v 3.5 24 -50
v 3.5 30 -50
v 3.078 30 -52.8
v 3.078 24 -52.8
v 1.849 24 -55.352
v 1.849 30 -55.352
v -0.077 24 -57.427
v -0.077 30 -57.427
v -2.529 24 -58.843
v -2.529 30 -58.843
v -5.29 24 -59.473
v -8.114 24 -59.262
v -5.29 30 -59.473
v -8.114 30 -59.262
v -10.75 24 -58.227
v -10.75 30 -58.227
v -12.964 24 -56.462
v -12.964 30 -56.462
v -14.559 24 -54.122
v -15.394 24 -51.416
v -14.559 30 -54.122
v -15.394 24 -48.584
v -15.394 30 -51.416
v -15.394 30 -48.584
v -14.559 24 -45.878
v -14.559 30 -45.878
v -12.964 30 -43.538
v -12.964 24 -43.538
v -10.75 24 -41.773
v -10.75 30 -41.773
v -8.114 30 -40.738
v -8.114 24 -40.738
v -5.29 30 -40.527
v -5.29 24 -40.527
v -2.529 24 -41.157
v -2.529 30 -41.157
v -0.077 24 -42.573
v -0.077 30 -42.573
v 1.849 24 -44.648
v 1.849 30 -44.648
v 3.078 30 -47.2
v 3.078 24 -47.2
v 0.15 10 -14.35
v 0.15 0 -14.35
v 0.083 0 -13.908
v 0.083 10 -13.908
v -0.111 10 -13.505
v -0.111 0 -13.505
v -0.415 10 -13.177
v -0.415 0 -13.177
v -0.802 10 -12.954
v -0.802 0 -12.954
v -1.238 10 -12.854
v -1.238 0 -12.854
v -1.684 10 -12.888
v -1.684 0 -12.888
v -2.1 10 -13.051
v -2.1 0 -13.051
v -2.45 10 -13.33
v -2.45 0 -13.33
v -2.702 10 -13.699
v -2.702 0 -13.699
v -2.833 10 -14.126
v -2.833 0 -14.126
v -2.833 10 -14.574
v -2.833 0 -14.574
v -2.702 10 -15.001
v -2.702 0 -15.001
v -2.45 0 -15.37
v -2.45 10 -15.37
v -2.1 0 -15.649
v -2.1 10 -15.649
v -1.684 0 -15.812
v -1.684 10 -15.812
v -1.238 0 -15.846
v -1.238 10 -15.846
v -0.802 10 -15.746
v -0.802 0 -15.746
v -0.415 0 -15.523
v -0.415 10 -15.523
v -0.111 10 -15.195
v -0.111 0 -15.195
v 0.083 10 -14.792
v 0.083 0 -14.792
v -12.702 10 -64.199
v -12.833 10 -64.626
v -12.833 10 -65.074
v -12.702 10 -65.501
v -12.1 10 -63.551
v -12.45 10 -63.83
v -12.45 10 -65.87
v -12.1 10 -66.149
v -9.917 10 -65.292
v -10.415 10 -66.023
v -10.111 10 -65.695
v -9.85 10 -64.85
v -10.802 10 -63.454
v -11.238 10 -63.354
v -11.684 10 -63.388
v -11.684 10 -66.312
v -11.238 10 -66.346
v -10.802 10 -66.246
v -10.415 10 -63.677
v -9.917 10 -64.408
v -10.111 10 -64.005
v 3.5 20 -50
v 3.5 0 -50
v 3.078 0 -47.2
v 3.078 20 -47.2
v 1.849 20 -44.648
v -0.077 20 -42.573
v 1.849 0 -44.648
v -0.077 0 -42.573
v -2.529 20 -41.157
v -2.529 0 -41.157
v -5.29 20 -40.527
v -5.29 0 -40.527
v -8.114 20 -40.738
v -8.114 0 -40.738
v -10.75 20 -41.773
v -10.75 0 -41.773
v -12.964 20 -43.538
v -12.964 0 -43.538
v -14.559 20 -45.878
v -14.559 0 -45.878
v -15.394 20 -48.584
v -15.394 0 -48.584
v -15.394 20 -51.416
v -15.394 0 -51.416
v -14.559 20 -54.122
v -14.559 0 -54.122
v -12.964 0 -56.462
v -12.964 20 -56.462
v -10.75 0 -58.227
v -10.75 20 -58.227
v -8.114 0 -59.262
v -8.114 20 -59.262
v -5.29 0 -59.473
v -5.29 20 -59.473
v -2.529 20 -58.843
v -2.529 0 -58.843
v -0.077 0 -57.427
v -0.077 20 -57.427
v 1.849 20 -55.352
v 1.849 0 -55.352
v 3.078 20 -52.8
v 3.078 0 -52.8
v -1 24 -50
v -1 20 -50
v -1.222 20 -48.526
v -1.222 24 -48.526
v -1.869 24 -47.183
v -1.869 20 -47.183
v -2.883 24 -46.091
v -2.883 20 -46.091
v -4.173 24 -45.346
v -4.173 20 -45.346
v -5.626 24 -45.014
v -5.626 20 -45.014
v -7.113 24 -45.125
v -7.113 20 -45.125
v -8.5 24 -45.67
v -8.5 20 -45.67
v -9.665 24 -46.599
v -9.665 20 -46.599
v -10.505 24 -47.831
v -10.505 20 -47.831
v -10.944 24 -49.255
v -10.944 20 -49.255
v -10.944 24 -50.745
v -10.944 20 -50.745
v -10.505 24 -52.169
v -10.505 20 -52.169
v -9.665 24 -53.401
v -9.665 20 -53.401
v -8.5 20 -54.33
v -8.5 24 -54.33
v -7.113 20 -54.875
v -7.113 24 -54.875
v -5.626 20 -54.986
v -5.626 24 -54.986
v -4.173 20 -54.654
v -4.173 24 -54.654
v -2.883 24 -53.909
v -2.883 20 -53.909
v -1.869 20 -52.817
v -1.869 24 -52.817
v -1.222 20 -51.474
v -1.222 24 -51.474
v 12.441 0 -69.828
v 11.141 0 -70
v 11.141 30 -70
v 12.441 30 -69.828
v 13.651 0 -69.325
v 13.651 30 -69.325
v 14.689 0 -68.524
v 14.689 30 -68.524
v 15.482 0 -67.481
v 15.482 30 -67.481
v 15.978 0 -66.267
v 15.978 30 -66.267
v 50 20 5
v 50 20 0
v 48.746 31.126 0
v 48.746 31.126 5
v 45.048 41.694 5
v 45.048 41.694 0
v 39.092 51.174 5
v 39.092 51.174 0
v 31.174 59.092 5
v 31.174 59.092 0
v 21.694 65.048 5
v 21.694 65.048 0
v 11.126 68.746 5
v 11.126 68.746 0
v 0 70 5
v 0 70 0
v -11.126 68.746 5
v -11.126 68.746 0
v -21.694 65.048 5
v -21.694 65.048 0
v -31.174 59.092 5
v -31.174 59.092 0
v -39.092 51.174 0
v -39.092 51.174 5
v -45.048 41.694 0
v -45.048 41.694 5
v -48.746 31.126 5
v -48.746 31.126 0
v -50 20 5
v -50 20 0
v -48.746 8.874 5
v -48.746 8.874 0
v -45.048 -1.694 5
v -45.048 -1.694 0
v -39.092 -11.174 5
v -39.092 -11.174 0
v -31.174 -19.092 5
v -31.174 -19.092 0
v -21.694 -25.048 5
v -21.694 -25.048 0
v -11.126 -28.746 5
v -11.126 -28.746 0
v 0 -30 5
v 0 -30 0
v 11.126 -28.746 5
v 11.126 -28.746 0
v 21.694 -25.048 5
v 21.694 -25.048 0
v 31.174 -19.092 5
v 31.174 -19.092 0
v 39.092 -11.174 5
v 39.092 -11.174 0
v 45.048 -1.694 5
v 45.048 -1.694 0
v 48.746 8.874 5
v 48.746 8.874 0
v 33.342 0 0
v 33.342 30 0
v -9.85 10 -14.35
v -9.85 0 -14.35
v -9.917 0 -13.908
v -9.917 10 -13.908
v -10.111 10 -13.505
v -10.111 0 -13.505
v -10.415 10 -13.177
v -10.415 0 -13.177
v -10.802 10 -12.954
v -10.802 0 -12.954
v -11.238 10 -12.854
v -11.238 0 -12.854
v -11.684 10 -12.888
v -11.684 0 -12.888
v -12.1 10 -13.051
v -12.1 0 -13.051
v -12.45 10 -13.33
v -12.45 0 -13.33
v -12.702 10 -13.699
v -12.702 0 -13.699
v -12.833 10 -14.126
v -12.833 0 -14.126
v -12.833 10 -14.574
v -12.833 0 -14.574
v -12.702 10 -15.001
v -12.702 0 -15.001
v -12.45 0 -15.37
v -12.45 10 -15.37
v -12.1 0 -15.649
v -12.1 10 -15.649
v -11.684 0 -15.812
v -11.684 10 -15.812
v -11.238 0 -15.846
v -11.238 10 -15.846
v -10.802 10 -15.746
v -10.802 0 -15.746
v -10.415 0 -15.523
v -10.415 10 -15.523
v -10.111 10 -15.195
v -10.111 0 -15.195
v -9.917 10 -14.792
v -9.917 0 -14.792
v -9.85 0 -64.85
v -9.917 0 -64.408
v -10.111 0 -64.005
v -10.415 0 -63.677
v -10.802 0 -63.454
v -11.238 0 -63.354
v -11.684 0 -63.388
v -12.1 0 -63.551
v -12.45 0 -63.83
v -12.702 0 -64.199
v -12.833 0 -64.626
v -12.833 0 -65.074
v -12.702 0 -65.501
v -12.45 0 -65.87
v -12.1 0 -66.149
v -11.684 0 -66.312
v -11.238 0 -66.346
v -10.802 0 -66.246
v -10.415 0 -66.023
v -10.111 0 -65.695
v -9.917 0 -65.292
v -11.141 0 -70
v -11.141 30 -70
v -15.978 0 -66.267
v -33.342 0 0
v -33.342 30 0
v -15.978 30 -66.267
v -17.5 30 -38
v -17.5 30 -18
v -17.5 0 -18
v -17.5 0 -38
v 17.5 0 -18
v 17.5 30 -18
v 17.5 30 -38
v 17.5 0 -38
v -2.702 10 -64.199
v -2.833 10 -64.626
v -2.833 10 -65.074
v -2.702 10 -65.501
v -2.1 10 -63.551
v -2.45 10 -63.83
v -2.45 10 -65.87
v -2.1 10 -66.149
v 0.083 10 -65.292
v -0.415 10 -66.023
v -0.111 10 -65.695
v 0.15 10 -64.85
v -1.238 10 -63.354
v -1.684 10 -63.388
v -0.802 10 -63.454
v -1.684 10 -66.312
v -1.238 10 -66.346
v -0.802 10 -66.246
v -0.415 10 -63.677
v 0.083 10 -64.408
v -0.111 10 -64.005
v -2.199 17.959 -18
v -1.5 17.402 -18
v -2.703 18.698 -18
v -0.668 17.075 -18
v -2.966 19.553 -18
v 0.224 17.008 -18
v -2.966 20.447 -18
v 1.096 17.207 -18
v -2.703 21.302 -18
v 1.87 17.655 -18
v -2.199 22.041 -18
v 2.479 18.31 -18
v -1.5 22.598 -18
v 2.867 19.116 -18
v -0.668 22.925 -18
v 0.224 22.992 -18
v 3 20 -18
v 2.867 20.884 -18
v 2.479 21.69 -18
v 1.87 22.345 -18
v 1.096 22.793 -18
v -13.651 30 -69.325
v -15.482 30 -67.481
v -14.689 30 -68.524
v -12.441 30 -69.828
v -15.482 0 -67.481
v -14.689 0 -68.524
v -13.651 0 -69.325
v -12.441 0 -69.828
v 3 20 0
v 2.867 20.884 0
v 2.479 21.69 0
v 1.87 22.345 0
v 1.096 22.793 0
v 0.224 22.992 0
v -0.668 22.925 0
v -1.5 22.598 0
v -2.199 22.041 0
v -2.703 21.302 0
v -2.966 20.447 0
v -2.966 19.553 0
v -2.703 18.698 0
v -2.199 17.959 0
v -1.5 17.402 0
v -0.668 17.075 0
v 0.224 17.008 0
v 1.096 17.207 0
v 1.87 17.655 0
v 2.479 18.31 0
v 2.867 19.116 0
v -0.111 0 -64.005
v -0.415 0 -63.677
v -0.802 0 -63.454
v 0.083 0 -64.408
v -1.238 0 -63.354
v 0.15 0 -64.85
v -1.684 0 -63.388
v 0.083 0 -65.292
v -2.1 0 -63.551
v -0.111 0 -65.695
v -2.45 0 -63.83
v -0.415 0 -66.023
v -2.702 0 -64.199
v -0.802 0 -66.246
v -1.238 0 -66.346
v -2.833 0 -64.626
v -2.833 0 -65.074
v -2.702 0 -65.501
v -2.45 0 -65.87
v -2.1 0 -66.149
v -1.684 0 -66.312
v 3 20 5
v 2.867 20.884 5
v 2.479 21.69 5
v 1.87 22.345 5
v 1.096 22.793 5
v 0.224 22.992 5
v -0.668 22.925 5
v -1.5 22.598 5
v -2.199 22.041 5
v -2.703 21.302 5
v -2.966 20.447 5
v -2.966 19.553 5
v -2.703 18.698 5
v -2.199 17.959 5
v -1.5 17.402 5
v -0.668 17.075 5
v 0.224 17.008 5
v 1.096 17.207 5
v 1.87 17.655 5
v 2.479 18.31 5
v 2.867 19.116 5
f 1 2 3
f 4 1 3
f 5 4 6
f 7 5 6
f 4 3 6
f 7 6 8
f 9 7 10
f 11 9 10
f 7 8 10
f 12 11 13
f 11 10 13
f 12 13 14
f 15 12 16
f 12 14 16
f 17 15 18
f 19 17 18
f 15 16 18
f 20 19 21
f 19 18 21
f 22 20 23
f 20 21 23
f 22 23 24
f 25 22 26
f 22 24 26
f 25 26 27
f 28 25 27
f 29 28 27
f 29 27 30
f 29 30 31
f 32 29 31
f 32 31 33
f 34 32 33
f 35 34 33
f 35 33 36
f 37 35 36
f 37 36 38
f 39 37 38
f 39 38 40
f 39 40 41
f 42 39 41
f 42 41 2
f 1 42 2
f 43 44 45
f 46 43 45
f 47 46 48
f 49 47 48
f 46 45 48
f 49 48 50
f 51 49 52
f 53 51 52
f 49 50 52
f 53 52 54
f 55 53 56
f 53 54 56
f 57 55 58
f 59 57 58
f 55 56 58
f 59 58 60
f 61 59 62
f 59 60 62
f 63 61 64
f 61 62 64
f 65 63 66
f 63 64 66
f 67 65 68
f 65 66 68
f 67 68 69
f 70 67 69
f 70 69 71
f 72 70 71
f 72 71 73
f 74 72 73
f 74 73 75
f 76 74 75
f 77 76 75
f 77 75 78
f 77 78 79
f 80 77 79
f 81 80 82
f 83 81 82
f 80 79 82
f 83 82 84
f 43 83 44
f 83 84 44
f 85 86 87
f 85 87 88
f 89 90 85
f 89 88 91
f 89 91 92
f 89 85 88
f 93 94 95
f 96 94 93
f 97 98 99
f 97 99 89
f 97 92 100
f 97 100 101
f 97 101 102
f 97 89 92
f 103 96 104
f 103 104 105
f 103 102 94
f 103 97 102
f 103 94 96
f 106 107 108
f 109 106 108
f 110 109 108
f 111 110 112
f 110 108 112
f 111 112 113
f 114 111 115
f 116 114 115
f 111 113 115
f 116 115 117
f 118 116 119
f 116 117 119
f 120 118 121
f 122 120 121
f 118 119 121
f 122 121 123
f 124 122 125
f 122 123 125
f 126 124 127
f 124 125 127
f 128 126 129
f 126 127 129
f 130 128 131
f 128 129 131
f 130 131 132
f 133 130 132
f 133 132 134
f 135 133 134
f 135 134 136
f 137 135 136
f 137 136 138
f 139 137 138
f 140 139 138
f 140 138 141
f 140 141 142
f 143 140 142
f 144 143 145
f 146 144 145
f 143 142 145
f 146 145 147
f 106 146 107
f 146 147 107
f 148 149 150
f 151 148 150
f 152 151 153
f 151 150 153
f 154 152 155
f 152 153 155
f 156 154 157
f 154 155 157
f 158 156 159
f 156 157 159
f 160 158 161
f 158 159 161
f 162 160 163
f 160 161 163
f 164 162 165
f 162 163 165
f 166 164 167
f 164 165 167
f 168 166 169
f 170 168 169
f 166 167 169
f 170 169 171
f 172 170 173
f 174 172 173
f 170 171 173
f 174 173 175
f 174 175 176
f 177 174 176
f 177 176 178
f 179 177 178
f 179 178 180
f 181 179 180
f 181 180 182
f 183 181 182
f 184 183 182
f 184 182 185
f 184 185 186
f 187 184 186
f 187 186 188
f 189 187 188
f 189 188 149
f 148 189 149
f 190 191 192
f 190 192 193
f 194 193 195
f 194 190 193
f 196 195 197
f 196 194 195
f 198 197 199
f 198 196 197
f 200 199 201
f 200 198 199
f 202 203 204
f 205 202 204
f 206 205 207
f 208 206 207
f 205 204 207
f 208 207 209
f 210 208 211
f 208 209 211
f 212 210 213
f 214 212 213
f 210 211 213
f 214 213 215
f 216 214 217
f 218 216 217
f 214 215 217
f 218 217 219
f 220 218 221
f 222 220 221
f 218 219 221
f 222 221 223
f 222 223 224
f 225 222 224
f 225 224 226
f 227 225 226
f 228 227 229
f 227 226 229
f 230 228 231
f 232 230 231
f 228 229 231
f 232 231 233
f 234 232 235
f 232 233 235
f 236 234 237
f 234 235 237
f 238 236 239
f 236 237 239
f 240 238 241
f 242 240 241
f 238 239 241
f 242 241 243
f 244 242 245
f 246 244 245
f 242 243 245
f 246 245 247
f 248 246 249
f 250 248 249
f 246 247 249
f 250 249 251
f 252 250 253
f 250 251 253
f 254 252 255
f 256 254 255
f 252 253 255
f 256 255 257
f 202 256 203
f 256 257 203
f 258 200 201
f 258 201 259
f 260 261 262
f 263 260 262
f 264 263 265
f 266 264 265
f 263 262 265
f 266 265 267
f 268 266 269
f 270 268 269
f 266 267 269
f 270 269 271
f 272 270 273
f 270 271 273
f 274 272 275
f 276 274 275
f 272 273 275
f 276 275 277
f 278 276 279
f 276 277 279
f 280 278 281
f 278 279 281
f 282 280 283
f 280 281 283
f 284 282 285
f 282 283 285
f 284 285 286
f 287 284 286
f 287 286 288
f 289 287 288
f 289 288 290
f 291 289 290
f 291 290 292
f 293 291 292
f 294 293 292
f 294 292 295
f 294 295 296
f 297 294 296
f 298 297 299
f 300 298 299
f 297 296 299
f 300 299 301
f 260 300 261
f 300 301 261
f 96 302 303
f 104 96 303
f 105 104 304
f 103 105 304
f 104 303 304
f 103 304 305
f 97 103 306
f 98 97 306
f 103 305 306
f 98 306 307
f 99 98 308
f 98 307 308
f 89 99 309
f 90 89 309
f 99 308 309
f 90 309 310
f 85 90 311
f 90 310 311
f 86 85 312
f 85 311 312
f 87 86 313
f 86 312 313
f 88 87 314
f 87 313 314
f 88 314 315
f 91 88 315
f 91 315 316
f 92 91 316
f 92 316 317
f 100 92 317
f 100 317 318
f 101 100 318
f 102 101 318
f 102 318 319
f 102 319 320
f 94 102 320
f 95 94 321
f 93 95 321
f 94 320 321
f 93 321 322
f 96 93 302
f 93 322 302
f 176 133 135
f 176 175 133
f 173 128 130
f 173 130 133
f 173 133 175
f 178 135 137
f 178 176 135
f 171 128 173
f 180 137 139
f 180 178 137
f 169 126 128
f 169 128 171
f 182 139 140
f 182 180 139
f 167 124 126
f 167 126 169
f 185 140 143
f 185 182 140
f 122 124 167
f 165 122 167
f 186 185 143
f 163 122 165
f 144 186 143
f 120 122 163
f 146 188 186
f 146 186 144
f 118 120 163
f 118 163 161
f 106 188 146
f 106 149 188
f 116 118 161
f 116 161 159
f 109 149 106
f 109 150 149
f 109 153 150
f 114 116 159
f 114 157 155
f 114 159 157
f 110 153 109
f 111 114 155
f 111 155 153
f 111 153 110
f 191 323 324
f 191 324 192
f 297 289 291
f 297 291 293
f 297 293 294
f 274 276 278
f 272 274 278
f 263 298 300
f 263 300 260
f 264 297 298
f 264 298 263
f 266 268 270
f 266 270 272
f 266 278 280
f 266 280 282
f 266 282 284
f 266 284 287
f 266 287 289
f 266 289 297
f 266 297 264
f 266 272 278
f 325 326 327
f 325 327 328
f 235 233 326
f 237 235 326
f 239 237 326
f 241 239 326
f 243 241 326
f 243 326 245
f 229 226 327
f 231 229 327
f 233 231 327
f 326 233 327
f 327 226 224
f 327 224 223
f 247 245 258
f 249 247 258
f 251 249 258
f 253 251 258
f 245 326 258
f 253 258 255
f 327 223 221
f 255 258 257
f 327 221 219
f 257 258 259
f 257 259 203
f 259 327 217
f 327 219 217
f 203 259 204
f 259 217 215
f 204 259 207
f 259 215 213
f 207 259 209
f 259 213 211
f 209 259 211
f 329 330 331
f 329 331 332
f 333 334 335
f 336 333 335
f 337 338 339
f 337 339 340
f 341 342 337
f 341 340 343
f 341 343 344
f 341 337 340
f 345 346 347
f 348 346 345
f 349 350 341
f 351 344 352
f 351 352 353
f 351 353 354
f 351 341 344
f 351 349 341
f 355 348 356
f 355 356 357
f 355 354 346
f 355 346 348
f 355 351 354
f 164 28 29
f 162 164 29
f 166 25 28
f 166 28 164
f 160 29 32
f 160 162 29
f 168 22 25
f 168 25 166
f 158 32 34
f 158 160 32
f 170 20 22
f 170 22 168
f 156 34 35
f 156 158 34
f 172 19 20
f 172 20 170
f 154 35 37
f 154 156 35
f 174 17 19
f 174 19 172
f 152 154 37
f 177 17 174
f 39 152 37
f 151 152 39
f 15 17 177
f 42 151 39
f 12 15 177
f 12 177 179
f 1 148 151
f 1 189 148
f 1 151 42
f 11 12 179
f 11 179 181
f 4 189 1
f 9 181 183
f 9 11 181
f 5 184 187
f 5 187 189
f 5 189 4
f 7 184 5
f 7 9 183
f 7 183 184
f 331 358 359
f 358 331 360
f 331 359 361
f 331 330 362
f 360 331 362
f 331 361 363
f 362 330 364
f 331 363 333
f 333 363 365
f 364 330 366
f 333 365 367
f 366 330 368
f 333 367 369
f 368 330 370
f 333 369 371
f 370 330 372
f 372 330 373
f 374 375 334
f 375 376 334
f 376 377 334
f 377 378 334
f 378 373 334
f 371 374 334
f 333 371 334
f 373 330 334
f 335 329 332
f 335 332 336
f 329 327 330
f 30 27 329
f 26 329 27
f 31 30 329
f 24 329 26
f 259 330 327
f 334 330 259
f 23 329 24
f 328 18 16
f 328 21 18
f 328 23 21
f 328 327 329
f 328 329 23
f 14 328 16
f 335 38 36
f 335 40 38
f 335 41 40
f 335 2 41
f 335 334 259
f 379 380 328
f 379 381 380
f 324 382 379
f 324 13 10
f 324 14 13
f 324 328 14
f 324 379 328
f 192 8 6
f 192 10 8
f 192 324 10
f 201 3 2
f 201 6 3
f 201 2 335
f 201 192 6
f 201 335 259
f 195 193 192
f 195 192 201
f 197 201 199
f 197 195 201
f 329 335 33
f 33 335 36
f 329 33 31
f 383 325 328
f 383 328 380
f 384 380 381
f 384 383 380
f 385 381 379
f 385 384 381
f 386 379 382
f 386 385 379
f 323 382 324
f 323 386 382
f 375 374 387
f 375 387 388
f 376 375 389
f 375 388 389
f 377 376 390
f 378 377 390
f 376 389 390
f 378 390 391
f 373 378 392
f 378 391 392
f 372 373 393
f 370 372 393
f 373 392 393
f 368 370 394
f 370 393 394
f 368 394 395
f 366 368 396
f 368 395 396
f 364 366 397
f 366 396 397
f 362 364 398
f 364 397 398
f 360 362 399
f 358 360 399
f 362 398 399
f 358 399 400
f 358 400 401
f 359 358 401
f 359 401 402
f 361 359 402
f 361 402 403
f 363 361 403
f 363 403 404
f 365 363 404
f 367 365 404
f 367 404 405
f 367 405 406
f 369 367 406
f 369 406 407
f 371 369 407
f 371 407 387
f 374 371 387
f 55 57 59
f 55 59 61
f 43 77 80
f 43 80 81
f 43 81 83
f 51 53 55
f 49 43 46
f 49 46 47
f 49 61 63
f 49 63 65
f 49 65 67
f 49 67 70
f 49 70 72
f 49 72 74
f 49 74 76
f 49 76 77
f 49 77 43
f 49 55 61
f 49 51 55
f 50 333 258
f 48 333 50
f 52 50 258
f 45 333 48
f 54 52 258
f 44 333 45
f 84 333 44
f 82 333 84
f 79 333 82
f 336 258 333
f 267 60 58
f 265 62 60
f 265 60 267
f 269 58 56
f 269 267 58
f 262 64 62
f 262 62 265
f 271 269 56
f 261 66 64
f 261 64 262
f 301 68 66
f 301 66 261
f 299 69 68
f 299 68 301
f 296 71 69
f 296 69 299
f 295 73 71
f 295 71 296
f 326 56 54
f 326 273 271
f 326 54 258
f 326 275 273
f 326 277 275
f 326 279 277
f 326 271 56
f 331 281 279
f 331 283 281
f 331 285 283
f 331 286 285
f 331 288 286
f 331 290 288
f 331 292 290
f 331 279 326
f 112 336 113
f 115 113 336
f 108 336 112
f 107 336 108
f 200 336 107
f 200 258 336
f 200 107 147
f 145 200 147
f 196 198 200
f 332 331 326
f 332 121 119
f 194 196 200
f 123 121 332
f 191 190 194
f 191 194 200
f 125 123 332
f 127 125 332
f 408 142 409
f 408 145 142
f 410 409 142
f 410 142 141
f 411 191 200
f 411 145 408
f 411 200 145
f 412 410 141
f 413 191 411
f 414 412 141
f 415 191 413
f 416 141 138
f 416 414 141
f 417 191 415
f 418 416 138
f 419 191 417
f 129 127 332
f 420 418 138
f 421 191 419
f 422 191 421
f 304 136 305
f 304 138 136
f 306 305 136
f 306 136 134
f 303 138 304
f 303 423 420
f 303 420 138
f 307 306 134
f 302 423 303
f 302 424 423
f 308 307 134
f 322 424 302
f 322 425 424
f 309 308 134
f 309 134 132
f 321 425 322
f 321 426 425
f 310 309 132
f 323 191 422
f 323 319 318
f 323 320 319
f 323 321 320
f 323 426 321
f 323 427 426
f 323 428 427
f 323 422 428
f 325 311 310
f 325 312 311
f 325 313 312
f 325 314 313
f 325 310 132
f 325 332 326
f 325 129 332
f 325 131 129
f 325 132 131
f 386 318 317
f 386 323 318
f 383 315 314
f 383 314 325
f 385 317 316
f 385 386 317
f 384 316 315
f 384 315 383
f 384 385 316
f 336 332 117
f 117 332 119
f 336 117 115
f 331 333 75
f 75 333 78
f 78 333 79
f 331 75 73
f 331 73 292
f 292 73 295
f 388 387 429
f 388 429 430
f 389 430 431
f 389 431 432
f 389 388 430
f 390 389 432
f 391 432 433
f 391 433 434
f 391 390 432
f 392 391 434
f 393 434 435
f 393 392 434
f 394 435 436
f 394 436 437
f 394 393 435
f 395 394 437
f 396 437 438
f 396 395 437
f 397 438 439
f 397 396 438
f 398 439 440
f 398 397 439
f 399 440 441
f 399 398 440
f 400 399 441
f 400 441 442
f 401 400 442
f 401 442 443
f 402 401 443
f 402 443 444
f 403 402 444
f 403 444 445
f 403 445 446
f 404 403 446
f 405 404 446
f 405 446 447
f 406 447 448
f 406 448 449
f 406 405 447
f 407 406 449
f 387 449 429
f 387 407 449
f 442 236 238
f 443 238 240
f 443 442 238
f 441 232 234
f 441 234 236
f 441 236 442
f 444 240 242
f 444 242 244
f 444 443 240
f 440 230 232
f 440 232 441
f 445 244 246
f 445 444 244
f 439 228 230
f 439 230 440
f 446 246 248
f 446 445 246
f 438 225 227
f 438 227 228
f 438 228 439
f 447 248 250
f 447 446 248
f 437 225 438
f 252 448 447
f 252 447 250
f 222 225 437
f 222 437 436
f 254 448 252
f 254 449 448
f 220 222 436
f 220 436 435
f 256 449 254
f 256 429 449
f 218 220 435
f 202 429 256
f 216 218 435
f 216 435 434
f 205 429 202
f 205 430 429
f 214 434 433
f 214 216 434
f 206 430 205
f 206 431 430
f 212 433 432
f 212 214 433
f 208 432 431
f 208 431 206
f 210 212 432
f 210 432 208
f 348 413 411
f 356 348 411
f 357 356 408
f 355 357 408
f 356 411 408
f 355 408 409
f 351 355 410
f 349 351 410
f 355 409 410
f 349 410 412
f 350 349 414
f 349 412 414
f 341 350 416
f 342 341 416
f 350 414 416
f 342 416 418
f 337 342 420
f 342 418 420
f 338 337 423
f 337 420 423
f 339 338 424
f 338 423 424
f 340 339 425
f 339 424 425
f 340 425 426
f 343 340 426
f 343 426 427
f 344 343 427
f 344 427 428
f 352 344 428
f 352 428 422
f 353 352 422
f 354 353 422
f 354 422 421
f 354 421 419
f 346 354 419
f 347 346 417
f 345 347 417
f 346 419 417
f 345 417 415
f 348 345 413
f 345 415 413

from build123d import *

# Parameters (mm, degrees)
BOSS_EXTRUDE1_DEPTH = 40
SKETCH9_R           = 9.5
CUT_EXTRUDE5_DEPTH  = 20
SKETCH10_R          = 5
CUT_EXTRUDE6_DEPTH  = 21
SKETCH11_R          = 9.5
CUT_EXTRUDE7_DEPTH  = 16
SKETCH14_W          = 35
SKETCH14_H          = 20
CUT_EXTRUDE9_DEPTH  = 41
SKETCH15_R          = 3
CUT_EXTRUDE10_DEPTH = 25
SKETCH16_R          = 50
SKETCH16_R_2        = 3
BOSS_EXTRUDE3_DEPTH = 5
SKETCH17_W          = 69.206254994
SKETCH17_H          = 74.867048483
CUT_EXTRUDE11_DEPTH = 10
SKETCH18_R          = 1.5
CUT_EXTRUDE12_DEPTH = 10
SKETCH20_R          = 1.5
CUT_EXTRUDE13_DEPTH = 10


with BuildPart() as part:
    # Sketch1 → Boss-Extrude1 (new body)
    with BuildSketch(Plane(origin=(0, 0, 0), x_dir=(1, 0, 0), z_dir=(0, 1, 0))):
        with BuildLine():
            Line((-11.141347684, 70), (11.141347684, 70))
            ThreePointArc((11.141347684, 70), (14.196114062, 68.958333283), (15.978061054, 66.267360951))
            Line((15.978061054, 66.267360951), (33.342055813, 0))
            Line((33.342055813, 0), (-33.342055813, 0))
            Line((-33.342055813, 0), (-15.978061054, 66.267360951))
            ThreePointArc((-15.978061054, 66.267360951), (-14.196114062, 68.958333283), (-11.141347684, 70))
        make_face()
    extrude(amount=BOSS_EXTRUDE1_DEPTH)

    # Sketch9 → Cut-Extrude5 (cut)
    with BuildSketch(Plane.XZ):
        with Locations((-6, -50)):
            Circle(SKETCH9_R)
    extrude(amount=-CUT_EXTRUDE5_DEPTH, mode=Mode.SUBTRACT)

    # Sketch10 → Cut-Extrude6 (cut, through all)
    with BuildSketch(Plane.XZ.offset(-20)):
        with Locations((-6, -50)):
            Circle(SKETCH10_R)
    extrude(amount=-CUT_EXTRUDE6_DEPTH, mode=Mode.SUBTRACT)

    # Sketch11 → Cut-Extrude7 (cut)
    with BuildSketch(Plane(origin=(0, 40, 0), x_dir=(1, 0, 0), z_dir=(0, 1, 0))):
        with Locations((-6, 50)):
            Circle(SKETCH11_R)
    extrude(amount=-CUT_EXTRUDE7_DEPTH, mode=Mode.SUBTRACT)

    # Sketch14 → Cut-Extrude9 (cut, through all)
    with BuildSketch(Plane(origin=(0, 40, 0), x_dir=(1, 0, 0), z_dir=(0, 1, 0))):
        with Locations((0, 28)):
            Rectangle(SKETCH14_W, SKETCH14_H)
    extrude(amount=-CUT_EXTRUDE9_DEPTH, mode=Mode.SUBTRACT)

    # Sketch15 → Cut-Extrude10 (cut)
    with BuildSketch(Plane.XY):
        with Locations((0, 20)):
            Circle(SKETCH15_R)
    extrude(amount=-CUT_EXTRUDE10_DEPTH, mode=Mode.SUBTRACT)

    # Sketch16 → Boss-Extrude3 (add)
    with BuildSketch(Plane.XY):
        with Locations((0, 20)):
            Circle(SKETCH16_R)
        with Locations((0, 20)):
            Circle(SKETCH16_R_2, mode=Mode.SUBTRACT)
    extrude(amount=BOSS_EXTRUDE3_DEPTH)

    # Sketch17 → Cut-Extrude11 (cut)
    with BuildSketch(Plane(origin=(0, 40, 0), x_dir=(1, 0, 0), z_dir=(0, 1, 0))):
        with Locations((1.261071684, 37.433524242)):
            Rectangle(SKETCH17_W, SKETCH17_H)
    extrude(amount=-CUT_EXTRUDE11_DEPTH, mode=Mode.SUBTRACT)

    # Sketch18 → Cut-Extrude12 (cut)
    with BuildSketch(Plane.XZ):
        with Locations((-1.350189987, -64.85)):
            Circle(SKETCH18_R)
        with Locations((-11.350189987, -64.85)):
            Circle(SKETCH18_R)
    extrude(amount=-CUT_EXTRUDE12_DEPTH, mode=Mode.SUBTRACT)

    # Sketch20 → Cut-Extrude13 (cut)
    with BuildSketch(Plane.XZ):
        with Locations((-11.350189987, -14.35)):
            Circle(SKETCH20_R)
        with Locations((-1.350189987, -14.35)):
            Circle(SKETCH20_R)
    extrude(amount=-CUT_EXTRUDE13_DEPTH, mode=Mode.SUBTRACT)


solid = part.part
